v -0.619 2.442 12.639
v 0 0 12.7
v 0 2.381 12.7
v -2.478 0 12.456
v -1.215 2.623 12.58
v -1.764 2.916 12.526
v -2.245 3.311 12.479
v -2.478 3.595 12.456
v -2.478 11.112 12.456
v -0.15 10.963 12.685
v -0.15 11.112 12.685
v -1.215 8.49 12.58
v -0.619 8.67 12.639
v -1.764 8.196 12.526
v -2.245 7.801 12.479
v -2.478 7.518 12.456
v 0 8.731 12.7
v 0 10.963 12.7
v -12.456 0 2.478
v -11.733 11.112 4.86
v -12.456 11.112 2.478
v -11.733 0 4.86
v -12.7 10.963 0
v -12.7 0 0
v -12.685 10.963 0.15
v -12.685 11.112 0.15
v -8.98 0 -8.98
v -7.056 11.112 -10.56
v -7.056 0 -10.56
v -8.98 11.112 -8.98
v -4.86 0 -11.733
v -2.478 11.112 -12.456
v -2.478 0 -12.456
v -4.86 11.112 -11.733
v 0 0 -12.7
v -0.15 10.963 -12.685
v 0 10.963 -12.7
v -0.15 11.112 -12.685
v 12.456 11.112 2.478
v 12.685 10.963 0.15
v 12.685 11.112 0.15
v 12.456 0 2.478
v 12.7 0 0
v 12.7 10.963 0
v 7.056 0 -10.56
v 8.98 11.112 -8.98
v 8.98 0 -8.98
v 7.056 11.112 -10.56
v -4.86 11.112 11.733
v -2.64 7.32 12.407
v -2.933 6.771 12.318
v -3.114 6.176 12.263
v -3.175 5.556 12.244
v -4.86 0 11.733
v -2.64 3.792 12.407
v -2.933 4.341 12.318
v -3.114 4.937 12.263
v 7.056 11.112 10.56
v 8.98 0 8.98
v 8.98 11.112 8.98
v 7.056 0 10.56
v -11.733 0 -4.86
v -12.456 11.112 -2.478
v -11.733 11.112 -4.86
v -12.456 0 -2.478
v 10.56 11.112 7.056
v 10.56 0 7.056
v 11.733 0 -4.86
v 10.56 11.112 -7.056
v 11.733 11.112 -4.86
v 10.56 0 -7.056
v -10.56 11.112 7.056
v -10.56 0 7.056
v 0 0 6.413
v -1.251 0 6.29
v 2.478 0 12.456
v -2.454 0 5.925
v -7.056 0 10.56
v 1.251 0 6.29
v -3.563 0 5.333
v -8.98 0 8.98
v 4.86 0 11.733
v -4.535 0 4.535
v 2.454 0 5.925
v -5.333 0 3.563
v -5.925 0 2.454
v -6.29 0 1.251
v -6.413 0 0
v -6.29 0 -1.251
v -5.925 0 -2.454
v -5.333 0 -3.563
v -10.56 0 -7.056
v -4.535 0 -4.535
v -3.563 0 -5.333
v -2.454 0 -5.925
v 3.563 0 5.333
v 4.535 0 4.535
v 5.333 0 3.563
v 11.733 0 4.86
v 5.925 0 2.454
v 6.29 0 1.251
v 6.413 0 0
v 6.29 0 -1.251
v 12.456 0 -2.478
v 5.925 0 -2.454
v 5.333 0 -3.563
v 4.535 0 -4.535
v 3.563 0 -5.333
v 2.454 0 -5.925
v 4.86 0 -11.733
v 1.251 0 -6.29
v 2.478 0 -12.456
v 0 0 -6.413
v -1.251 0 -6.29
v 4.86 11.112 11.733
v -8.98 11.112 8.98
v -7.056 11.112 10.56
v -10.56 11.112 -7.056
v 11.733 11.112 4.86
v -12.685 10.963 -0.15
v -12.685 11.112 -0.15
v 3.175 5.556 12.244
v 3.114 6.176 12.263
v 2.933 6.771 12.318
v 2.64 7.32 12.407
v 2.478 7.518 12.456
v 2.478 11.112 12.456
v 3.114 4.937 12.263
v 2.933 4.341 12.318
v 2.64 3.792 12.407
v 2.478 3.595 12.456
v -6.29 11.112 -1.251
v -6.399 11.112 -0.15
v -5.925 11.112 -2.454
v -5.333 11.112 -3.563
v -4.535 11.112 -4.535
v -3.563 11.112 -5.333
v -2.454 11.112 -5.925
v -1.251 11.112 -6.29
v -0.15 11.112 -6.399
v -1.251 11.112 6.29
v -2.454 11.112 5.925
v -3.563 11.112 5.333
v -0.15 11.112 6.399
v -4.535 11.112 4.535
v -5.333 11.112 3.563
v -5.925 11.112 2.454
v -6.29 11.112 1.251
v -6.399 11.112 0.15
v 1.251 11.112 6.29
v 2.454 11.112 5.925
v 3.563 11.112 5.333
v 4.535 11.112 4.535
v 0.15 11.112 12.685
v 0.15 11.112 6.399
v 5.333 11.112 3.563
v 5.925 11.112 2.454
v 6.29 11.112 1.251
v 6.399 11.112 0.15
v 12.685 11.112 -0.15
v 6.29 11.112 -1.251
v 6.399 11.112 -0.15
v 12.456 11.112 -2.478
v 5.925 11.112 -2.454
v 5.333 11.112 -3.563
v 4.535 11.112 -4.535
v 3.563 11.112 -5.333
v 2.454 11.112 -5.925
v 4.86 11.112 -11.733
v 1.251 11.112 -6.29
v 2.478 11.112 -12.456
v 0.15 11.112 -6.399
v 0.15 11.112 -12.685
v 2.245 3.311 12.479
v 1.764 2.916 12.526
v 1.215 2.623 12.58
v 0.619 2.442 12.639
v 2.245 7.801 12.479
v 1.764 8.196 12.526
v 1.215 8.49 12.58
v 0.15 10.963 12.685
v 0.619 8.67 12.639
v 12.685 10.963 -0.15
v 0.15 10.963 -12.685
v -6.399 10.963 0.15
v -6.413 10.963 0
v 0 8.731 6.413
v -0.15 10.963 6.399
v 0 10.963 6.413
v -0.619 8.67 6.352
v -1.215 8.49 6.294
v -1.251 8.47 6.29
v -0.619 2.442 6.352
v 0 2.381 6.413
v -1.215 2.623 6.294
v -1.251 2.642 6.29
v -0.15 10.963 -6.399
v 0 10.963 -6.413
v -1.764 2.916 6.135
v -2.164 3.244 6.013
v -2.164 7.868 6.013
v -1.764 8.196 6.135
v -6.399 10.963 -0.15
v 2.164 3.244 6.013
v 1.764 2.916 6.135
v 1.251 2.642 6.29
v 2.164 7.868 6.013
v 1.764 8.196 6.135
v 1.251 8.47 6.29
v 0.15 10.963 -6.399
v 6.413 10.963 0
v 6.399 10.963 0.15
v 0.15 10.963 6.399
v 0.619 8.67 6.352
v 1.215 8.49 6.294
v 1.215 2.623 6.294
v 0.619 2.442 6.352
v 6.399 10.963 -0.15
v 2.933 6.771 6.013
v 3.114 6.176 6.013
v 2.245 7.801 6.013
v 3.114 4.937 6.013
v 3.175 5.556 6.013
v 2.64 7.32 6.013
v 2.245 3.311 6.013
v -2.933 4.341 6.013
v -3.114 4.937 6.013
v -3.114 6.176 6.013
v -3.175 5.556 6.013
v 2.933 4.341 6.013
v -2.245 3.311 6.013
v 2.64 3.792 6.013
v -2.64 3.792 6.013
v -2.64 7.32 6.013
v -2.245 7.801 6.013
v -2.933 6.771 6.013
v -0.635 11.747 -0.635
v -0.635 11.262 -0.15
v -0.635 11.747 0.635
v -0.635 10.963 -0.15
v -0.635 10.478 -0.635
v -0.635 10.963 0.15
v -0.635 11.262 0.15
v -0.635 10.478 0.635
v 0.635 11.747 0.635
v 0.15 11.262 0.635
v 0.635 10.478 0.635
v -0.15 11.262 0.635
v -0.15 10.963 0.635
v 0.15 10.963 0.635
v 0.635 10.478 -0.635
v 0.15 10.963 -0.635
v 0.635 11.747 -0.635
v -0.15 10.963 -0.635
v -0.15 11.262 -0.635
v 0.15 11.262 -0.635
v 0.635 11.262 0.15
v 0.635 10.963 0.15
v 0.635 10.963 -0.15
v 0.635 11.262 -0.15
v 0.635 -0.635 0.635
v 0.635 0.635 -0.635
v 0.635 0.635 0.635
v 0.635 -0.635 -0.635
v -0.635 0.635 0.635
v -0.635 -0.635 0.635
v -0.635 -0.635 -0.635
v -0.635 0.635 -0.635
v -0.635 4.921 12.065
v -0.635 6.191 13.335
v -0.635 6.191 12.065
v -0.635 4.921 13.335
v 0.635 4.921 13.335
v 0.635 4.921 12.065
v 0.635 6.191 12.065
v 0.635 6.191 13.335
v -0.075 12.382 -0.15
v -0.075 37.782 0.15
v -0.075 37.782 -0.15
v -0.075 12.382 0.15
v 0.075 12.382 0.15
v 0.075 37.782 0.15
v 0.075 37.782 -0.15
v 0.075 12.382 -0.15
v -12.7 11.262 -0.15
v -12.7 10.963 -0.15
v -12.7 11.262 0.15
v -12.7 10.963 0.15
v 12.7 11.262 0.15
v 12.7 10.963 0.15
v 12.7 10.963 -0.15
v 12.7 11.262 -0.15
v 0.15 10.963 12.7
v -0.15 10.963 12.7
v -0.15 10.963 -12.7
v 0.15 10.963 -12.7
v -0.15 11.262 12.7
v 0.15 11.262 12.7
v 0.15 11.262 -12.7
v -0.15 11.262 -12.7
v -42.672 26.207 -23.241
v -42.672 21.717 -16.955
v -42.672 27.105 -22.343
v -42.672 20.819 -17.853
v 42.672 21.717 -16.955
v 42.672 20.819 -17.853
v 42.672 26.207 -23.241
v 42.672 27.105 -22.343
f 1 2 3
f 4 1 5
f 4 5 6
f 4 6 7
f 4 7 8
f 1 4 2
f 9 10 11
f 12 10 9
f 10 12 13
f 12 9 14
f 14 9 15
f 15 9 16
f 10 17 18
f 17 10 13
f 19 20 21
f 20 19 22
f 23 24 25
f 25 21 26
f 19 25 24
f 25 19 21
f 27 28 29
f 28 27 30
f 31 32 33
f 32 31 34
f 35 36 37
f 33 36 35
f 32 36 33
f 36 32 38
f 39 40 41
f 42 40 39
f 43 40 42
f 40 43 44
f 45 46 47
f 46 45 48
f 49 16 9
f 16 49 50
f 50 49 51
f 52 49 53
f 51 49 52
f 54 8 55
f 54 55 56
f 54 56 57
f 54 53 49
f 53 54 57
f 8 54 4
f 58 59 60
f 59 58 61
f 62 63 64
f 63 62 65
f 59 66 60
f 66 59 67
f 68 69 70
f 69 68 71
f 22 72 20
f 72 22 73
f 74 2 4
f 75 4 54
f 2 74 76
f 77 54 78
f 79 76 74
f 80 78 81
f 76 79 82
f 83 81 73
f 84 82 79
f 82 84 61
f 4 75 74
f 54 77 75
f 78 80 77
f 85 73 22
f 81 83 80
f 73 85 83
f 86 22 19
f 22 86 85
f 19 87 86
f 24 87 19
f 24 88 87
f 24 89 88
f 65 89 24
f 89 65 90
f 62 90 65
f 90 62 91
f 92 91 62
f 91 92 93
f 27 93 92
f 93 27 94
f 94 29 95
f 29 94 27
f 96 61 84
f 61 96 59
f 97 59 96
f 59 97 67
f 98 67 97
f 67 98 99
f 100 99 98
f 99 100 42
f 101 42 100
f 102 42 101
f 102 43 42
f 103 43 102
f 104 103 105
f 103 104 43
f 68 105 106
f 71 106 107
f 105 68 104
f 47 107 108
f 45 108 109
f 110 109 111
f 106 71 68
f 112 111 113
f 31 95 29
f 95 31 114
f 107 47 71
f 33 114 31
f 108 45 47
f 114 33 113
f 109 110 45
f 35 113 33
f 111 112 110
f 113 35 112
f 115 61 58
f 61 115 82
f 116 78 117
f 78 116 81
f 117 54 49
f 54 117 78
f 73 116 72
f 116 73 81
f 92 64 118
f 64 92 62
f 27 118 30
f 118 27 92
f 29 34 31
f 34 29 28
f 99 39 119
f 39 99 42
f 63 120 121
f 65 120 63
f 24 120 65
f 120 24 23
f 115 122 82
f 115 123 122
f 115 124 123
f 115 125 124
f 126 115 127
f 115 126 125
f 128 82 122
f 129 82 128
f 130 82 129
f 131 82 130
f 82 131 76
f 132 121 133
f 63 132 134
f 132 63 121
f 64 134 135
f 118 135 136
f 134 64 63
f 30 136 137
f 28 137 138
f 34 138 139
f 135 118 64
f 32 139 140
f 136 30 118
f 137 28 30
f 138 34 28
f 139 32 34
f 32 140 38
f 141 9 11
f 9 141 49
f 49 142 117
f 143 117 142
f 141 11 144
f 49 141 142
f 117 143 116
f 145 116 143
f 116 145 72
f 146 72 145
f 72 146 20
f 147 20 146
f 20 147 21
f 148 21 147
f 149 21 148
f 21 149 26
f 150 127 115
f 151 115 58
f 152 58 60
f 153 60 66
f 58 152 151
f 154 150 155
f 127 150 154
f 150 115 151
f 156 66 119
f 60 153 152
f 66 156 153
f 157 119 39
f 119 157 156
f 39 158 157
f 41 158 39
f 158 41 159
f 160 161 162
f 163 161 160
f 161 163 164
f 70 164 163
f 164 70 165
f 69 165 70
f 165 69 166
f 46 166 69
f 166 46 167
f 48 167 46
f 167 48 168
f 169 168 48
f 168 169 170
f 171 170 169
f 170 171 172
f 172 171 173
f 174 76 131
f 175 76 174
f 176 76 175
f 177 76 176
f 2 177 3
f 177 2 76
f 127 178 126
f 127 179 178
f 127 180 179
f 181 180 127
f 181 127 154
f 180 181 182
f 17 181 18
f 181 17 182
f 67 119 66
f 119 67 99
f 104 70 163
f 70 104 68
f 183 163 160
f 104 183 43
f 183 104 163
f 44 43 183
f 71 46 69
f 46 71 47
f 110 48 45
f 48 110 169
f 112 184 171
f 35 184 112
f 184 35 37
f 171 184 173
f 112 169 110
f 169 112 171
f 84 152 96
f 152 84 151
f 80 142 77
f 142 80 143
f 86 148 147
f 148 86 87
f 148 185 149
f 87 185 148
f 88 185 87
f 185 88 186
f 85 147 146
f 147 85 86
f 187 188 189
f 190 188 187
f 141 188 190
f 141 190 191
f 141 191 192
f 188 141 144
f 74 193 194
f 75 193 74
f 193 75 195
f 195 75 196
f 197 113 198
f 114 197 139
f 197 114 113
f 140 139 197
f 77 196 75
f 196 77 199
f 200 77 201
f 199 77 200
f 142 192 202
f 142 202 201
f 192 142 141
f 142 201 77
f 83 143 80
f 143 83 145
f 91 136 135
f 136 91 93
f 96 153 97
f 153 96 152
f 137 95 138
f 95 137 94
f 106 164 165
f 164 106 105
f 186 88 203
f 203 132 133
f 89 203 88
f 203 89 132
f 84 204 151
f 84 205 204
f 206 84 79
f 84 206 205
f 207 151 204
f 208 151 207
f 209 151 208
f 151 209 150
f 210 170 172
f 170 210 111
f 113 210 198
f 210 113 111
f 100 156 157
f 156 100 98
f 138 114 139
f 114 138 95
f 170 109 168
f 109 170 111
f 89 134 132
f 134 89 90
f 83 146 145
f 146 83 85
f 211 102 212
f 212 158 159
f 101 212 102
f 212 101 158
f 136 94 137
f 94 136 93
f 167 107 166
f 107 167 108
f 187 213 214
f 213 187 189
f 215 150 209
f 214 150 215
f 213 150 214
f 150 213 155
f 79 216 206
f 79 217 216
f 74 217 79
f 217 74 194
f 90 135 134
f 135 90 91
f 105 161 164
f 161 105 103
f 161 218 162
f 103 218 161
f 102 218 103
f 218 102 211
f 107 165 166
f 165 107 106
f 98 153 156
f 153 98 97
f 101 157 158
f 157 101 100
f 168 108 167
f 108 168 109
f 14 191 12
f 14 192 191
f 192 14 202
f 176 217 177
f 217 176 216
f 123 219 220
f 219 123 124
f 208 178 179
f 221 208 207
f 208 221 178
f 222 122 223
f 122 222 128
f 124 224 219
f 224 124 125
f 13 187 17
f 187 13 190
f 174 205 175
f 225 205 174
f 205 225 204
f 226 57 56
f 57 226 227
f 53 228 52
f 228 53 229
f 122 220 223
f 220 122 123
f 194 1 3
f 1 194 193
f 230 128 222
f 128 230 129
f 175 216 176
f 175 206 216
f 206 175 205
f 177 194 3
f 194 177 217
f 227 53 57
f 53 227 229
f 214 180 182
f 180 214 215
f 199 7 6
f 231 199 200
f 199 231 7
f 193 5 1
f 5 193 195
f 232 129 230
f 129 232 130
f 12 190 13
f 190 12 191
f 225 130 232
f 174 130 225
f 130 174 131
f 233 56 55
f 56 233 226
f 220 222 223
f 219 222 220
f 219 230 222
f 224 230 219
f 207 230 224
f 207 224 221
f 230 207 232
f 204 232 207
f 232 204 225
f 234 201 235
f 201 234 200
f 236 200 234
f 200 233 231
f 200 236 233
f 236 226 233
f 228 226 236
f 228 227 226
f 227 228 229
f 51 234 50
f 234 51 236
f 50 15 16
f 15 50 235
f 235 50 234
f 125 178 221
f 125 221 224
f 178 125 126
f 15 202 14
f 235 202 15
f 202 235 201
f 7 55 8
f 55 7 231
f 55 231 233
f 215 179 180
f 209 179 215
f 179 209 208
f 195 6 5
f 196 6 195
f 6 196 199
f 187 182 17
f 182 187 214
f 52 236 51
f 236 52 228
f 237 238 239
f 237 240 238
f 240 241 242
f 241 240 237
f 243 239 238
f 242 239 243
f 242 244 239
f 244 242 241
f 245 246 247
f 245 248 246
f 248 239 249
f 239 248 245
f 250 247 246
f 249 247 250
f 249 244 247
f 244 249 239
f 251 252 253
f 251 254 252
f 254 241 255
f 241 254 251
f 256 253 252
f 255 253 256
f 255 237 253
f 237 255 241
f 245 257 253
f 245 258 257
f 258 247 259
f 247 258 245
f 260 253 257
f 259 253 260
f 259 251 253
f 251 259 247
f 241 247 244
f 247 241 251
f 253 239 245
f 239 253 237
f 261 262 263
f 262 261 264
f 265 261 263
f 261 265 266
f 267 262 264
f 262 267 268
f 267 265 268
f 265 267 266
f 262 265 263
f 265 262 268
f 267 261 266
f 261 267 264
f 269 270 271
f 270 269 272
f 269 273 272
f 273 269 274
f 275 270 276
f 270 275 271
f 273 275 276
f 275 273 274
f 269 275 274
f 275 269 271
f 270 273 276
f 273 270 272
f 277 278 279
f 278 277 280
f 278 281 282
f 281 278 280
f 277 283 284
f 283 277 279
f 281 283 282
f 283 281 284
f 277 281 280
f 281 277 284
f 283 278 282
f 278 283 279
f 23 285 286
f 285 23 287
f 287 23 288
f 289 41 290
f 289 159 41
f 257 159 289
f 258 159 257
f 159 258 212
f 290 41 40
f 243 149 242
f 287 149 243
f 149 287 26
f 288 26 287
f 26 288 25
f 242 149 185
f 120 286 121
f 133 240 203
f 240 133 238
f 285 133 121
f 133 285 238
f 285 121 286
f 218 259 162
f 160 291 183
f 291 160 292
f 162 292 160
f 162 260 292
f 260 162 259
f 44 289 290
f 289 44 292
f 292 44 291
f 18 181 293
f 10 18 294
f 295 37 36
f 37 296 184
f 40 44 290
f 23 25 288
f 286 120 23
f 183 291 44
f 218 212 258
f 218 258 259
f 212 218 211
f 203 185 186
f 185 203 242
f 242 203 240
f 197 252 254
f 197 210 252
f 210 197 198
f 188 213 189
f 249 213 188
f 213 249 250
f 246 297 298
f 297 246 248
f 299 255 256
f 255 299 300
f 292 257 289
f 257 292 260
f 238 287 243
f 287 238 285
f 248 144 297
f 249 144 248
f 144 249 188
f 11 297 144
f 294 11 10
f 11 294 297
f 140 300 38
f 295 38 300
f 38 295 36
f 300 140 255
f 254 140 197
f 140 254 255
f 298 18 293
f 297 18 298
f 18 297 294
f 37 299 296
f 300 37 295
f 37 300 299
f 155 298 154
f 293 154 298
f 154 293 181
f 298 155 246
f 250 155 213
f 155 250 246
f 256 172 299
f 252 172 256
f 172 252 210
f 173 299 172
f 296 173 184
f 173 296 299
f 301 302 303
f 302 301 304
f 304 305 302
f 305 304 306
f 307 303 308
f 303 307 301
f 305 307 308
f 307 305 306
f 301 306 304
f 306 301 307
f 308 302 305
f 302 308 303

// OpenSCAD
include <../mo/mo.scad>

CollarDepth = 0.4375 * in;
CollarOutsideDiameter = 1 * in;
CollarInsideDiameter = 0.505 * in;
CollarSetScrewDiameter = 0.25 * in;
CollarThickness = ( CollarOutsideDiameter - CollarInsideDiameter ) / 2;


positions = [
  [ [ 0, 0, 0 ], [ 0, 0, 1 ], 0 ],
  [ [ 0, CollarDepth, 0 ], [ 0, 0, 1 ], 180 ],
  [ [ 0, CollarDepth/2, CollarOutsideDiameter/2 ], [ 1, 0, 0 ], -90 ],
];

module actCollarSetScrew0_5( p = 0, info = false ) {
  moPresent( positions, p, info )
    color( Steel ) {
      moPose( [ 90, 0, 0], [ 0, CollarDepth / 2, 0 ] )
        difference() {
          cylinder( h = CollarDepth, d = CollarOutsideDiameter, center = true, $fn = 32 );
          cylinder( h = CollarDepth + Epsilon, d = CollarInsideDiameter, center = true, $fn = 32 );
          moPose( [ 90, 0, 180 ], [ 0, CollarInsideDiameter / 2 + CollarThickness / 2, 0 ] )
            cylinder( h = CollarThickness + 8 * Epsilon, d = CollarSetScrewDiameter, center = true, $fn = 32 );
      }
    }
}

function actCollarSetScrew0_5Positions( p = 0 ) = positions[ p ];

moMoveTo( actCollarSetScrew0_5Positions( 1 ) )
  actCollarSetScrew0_5( 0, info = true, $name = true );
